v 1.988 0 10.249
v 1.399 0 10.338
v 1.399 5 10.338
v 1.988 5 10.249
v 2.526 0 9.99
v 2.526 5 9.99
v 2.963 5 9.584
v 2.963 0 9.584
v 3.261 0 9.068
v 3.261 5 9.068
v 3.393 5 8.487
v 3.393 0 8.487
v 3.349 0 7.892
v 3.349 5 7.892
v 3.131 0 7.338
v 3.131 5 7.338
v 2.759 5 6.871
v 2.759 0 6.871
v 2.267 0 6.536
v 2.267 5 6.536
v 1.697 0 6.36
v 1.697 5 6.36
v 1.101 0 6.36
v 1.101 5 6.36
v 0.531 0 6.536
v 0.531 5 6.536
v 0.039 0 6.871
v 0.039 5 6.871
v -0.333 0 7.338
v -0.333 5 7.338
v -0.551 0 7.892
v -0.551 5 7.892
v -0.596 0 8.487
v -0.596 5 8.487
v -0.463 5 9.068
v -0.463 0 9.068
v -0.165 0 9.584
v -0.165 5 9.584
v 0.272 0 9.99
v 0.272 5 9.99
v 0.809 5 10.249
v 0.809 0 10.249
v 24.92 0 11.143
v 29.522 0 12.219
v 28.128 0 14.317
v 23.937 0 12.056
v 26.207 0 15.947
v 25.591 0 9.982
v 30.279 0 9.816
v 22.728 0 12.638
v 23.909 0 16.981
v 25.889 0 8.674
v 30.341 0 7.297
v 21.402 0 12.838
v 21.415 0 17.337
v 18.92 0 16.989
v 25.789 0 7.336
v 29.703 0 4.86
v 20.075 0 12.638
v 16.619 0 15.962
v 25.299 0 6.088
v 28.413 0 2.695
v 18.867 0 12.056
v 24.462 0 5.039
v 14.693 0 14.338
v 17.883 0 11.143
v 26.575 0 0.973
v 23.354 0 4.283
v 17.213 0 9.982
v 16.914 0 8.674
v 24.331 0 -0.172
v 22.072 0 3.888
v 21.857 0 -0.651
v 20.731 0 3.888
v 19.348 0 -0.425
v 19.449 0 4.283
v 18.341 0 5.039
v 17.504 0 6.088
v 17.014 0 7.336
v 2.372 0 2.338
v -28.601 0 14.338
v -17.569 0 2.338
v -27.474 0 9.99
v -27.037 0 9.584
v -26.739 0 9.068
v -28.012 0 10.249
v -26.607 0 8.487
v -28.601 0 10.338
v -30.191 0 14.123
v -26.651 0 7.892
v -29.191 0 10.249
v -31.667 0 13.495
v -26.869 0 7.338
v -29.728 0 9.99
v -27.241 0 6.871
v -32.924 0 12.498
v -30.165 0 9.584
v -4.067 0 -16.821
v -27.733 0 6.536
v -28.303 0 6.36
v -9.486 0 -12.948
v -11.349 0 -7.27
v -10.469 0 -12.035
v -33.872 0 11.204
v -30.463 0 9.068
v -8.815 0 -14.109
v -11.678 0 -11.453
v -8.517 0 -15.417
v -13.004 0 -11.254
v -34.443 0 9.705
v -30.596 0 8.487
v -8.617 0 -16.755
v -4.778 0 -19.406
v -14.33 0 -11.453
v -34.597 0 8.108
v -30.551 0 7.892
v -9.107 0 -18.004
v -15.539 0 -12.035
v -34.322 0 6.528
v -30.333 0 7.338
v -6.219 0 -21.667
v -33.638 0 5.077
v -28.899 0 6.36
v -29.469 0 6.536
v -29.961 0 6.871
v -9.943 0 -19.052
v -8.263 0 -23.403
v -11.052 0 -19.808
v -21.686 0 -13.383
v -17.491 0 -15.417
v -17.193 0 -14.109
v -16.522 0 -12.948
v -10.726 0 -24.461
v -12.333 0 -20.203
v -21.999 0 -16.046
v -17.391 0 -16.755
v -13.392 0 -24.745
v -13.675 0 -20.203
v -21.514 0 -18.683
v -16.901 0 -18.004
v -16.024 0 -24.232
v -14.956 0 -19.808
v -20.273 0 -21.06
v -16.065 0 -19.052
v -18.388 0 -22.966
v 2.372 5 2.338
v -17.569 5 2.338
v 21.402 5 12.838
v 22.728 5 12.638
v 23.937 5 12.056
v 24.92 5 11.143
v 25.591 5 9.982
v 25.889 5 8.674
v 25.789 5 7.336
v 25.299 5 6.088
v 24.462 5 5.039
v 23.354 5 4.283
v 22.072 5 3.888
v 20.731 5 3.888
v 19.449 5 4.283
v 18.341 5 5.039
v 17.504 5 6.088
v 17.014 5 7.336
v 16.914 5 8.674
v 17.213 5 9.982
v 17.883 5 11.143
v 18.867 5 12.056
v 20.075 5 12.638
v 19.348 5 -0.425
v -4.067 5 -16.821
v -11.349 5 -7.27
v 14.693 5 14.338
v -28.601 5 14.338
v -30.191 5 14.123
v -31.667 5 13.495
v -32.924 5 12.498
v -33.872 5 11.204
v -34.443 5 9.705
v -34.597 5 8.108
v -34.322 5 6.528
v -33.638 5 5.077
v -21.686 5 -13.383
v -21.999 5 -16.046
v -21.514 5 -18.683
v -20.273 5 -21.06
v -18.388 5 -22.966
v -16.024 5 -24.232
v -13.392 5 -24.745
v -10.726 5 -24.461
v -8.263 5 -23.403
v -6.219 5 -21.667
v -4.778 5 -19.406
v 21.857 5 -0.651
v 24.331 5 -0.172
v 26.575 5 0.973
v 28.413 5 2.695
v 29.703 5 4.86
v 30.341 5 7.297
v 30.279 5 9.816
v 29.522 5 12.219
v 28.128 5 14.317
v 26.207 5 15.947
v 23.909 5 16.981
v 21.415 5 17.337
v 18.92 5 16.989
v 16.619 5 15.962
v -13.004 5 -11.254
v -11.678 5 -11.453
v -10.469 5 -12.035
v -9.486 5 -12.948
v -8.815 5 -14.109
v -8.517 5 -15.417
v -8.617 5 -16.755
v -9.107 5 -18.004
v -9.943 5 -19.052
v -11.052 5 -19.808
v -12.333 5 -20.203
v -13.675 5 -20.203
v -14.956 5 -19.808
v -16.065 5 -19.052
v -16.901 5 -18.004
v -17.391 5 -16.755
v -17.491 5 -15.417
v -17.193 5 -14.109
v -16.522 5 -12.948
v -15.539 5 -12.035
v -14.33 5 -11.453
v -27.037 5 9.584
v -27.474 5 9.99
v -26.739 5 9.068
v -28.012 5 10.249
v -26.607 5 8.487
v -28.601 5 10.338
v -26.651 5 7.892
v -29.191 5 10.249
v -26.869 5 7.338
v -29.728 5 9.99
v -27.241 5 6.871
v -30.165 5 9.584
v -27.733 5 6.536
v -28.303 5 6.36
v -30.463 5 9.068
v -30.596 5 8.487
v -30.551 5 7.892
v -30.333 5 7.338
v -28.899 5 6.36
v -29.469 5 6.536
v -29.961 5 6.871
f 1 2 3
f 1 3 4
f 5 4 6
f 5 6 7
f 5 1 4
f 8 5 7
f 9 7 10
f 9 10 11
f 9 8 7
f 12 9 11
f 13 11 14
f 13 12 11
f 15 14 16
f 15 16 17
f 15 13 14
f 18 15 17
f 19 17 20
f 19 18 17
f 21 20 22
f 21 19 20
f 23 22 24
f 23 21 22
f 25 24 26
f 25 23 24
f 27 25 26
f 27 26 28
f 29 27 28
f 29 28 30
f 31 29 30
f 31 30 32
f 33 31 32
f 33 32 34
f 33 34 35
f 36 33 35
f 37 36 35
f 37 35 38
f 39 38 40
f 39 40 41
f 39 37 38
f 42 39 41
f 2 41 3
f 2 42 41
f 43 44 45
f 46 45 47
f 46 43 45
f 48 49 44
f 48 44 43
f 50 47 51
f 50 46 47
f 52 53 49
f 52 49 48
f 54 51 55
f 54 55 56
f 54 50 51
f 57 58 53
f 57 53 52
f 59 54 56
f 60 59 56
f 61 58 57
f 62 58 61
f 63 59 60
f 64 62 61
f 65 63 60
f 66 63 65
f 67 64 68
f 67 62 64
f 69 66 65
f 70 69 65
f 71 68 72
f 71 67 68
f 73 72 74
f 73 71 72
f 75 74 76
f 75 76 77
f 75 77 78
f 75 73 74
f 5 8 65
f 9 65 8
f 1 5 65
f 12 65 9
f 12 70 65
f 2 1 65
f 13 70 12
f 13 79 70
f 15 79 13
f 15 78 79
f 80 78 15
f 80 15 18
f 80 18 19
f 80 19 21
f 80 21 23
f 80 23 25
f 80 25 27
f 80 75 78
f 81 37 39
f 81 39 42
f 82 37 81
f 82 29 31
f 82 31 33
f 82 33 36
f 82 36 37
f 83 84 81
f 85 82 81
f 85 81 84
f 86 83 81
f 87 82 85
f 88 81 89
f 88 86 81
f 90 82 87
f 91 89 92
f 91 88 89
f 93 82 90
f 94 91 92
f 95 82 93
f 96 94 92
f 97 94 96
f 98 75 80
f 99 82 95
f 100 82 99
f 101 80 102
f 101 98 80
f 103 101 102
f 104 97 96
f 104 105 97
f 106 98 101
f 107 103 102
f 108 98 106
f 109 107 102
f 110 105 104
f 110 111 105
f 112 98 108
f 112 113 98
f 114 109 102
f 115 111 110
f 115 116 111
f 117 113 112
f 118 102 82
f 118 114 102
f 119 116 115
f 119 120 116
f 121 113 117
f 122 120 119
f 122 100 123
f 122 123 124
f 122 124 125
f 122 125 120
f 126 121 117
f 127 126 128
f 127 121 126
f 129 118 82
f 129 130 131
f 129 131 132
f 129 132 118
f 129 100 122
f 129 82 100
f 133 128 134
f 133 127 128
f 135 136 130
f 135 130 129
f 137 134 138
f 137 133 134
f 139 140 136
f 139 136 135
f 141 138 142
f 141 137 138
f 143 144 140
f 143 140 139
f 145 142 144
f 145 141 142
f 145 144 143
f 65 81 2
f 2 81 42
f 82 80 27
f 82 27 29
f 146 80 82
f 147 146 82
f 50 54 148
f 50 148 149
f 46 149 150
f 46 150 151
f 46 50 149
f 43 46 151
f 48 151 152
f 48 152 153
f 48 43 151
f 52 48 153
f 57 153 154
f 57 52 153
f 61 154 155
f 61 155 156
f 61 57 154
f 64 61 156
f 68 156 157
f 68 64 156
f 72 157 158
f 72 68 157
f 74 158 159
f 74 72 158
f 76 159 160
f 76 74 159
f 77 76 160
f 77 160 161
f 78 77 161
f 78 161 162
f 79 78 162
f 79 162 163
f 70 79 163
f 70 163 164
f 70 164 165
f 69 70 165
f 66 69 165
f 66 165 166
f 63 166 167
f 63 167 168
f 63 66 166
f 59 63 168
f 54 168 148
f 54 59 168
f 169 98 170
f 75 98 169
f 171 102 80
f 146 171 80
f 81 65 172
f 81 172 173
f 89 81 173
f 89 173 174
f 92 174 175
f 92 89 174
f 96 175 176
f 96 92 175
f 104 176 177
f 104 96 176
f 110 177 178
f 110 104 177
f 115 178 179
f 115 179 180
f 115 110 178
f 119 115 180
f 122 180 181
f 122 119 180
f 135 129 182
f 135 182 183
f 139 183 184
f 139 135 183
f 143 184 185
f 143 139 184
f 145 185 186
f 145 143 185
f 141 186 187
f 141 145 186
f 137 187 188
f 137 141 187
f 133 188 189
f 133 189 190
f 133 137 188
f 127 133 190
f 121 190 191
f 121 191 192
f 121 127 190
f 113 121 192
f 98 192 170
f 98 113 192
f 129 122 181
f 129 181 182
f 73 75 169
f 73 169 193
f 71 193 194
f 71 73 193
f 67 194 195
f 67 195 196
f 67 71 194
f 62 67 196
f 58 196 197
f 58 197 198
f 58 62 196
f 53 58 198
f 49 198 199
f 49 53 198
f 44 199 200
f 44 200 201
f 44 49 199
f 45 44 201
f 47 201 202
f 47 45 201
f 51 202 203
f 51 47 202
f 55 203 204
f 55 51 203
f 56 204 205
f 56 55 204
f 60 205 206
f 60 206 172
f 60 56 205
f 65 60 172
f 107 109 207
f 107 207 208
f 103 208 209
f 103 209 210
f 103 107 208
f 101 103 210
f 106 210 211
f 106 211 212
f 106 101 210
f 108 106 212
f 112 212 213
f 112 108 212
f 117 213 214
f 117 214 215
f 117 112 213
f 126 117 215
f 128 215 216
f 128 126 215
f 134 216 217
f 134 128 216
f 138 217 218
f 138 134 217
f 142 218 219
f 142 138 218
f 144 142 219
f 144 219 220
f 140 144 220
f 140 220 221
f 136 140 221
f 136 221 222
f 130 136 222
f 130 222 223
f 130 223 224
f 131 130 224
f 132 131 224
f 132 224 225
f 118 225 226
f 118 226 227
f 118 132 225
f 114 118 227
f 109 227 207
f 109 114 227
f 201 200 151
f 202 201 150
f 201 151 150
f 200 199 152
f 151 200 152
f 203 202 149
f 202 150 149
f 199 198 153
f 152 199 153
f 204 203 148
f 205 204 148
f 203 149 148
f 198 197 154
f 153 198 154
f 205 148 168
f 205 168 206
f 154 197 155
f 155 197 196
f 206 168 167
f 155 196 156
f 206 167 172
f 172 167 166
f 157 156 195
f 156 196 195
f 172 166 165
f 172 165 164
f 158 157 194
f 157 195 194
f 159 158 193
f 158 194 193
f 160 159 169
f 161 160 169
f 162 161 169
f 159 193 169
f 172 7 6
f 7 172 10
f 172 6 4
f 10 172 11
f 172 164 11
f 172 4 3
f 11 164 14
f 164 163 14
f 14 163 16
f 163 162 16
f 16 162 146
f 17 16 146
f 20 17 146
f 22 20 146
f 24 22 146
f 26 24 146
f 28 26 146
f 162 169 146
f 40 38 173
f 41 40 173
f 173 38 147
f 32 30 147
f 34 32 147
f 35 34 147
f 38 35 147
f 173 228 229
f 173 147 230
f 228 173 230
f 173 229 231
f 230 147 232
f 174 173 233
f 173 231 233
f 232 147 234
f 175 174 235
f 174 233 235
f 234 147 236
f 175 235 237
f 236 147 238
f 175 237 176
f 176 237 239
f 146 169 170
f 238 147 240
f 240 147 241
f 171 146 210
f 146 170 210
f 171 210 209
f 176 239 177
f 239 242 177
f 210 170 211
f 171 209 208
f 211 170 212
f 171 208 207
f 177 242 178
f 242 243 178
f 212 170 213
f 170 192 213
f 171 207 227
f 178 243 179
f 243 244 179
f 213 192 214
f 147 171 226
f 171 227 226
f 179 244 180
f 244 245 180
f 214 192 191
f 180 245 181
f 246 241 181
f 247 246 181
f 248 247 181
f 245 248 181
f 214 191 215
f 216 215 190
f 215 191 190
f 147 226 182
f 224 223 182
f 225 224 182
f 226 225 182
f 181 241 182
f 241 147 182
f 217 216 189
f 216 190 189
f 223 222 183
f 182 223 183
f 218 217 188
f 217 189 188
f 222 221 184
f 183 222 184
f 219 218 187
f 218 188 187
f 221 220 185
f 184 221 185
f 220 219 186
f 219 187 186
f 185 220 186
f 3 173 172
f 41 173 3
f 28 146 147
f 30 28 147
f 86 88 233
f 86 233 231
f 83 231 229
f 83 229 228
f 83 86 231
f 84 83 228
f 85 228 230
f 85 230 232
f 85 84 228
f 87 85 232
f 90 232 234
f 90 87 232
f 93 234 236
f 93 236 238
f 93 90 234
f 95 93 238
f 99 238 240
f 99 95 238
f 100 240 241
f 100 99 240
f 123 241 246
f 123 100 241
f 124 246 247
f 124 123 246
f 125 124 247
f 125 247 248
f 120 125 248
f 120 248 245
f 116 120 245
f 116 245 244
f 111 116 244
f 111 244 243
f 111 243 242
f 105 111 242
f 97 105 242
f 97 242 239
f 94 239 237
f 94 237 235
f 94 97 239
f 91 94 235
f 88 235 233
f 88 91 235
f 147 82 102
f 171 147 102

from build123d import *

# Parameters (mm, degrees)
SKETCH_1_R      = 2
SKETCH_1_R_2    = 4.5
EXTRUDE_1_DEPTH = 5


with BuildPart() as part:
    # 草图1 → 凸台-拉伸1 (new body)
    with BuildSketch(Plane(origin=(0, 0, 0), x_dir=(1, 0, 0), z_dir=(0, 1, 0))):
        with BuildLine():
            Line((-4.067495668, 16.82077086), (19.347989798, 0.425071426))
            ThreePointArc((19.347989798, 0.425071426), (29.985022701, -11.043860741), (14.693366212, -14.337508546))
            Line((14.693366212, -14.337508546), (-28.601114149, -14.337508546))
            ThreePointArc((-28.601114149, -14.337508546), (-33.872016823, -11.20414159), (-33.637695408, -5.076703549))
            Line((-33.637695408, -5.076703549), (-21.686265326, 13.383262263))
            ThreePointArc((-21.686265326, 13.383262263), (-14.727441536, 24.58696991), (-4.067495668, 16.82077086))
        make_face()
        with Locations(Location((1.398885851, -8.337508546, 0), (0, 0, 270))):
            Circle(SKETCH_1_R, mode=Mode.SUBTRACT)
        with Locations(Location((21.401570144, -8.337508546, 0), (0, 0, 270))):
            Circle(SKETCH_1_R_2, mode=Mode.SUBTRACT)
        with Locations(Location((-28.601114149, -8.337508546, 0), (0, 0, 270))):
            Circle(SKETCH_1_R, mode=Mode.SUBTRACT)
        with Locations(Location((-13.003993251, 15.7535263, 0), (0, 0, 270))):
            Circle(SKETCH_1_R_2, mode=Mode.SUBTRACT)
        Polygon((-11.348795412, 7.269896763), (2.37200133, -2.337508546), (-17.56886288, -2.337508546), align=None, mode=Mode.SUBTRACT)
    extrude(amount=EXTRUDE_1_DEPTH)


solid = part.part
